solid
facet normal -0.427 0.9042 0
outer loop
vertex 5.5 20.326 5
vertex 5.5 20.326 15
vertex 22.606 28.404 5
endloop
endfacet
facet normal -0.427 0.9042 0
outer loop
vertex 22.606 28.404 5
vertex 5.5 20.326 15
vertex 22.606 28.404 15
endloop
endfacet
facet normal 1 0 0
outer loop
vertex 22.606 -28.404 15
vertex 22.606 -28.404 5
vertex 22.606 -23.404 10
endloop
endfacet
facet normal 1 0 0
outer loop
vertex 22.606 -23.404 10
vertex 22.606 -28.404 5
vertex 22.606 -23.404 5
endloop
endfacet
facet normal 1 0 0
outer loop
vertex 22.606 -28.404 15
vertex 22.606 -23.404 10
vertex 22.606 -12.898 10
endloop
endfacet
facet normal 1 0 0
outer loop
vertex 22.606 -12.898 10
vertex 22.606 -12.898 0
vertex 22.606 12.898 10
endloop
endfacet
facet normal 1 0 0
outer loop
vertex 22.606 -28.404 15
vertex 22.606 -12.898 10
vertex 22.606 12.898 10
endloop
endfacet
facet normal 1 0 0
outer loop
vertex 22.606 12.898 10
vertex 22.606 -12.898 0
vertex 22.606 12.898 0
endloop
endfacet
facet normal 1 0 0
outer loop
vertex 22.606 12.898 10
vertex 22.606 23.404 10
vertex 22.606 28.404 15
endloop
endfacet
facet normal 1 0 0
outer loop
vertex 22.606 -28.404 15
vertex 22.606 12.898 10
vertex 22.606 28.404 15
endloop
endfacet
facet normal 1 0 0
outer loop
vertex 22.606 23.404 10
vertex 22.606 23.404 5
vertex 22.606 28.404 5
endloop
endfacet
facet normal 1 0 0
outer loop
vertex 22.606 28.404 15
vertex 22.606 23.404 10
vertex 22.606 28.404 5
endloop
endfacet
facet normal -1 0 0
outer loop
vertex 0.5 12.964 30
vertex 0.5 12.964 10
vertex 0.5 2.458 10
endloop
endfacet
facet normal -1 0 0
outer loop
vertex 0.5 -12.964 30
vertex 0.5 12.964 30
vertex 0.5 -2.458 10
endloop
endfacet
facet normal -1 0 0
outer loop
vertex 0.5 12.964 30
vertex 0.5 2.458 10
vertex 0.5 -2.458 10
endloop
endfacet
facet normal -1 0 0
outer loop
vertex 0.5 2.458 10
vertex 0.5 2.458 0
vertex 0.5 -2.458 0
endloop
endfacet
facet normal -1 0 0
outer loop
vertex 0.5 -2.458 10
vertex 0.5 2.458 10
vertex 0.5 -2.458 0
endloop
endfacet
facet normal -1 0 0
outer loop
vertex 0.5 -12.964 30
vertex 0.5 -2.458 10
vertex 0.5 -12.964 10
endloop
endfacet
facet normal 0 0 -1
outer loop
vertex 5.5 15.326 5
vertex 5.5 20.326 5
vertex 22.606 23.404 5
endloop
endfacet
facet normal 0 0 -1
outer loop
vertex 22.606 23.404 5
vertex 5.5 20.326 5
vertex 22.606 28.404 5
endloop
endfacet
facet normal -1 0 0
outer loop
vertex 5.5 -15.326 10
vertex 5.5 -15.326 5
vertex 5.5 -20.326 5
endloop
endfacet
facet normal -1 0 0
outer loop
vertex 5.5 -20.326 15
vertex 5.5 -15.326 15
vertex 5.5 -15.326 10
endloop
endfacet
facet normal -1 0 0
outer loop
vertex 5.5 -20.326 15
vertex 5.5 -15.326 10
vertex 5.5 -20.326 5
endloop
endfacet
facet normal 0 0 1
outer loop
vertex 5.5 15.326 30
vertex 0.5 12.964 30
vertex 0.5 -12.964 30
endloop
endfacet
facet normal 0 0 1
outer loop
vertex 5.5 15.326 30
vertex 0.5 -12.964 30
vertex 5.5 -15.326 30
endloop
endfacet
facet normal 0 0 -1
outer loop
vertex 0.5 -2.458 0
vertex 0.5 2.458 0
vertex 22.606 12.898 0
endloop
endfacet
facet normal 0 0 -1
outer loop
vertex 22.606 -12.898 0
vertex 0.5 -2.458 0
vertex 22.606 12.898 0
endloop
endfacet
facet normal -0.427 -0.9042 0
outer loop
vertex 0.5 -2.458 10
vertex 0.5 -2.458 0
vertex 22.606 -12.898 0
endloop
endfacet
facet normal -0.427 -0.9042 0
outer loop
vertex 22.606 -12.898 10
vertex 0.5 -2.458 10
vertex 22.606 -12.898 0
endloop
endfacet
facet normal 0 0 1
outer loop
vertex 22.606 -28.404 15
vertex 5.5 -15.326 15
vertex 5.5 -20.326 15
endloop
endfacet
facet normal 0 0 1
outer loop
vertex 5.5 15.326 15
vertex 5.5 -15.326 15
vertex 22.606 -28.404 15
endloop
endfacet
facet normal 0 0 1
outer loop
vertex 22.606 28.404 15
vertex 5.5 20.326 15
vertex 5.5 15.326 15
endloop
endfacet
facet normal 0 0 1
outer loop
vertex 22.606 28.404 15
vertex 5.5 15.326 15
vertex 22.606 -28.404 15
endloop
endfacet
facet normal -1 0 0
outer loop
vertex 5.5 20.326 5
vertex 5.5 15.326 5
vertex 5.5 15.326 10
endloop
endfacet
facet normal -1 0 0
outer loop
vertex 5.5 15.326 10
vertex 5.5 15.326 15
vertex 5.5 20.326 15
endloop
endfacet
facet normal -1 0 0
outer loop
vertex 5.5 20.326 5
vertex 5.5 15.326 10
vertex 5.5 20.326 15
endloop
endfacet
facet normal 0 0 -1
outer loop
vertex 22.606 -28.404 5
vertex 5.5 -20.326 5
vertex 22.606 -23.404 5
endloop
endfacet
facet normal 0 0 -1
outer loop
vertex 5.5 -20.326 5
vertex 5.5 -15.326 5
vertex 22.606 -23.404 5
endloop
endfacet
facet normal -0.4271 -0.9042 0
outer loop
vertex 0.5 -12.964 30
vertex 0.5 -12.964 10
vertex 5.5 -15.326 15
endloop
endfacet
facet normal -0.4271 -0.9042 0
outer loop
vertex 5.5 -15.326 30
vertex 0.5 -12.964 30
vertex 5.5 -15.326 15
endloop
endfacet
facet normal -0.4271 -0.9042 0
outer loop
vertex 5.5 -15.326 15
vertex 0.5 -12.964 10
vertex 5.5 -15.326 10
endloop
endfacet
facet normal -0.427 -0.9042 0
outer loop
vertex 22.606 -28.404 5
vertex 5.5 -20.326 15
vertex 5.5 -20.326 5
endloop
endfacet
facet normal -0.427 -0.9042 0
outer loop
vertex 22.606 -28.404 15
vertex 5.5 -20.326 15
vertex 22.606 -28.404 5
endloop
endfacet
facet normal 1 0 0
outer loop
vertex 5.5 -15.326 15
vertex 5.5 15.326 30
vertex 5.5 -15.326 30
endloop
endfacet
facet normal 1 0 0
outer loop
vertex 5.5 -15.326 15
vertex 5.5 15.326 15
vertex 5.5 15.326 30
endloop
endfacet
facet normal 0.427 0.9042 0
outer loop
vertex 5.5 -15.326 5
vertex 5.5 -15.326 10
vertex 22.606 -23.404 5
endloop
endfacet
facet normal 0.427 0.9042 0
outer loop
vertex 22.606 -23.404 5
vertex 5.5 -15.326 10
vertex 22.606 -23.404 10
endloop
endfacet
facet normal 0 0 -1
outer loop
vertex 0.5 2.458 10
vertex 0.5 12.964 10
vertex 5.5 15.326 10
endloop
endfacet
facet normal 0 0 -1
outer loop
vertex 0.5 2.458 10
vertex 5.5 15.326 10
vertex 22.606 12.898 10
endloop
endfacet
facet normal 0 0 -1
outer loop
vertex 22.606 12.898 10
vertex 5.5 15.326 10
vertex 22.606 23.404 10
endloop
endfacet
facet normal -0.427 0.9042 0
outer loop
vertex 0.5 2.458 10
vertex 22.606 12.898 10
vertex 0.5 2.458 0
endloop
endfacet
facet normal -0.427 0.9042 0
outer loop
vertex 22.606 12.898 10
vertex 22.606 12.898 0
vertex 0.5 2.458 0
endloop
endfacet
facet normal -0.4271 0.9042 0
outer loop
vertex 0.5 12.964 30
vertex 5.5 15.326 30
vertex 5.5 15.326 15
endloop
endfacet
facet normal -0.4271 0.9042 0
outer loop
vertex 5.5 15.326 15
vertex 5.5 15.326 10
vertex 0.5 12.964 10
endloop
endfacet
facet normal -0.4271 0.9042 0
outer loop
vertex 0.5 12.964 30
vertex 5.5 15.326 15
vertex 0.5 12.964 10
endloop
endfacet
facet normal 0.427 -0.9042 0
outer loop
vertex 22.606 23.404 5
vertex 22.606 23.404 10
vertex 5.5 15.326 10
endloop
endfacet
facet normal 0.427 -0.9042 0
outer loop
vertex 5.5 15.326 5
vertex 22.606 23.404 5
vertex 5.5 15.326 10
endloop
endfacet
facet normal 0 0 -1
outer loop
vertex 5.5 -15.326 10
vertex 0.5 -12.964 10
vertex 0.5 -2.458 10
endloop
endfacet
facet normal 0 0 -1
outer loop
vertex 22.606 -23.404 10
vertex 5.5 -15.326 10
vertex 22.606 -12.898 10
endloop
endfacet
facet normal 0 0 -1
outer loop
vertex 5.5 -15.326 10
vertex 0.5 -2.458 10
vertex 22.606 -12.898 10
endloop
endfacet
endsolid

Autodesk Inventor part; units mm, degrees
ref_plane "YZ Plane" through (0, 0, 0) normal (1, 0, 0) x (0, 1, 0)
ref_plane "XZ Plane" through (0, 0, 0) normal (0, 1, 0) x (-1, 0, 0)
ref_plane "XY Plane" through (0, 0, 0) normal (0, 0, 1) x (1, 0, 0)
sketch "스케치1" plane through (0, 0, 0) normal (0, 0, 1) x (1, 0, 0)
  line L0 (0, 2.222) -> (0, -2.222)
  line L1 (0, -2.222) -> (22.6058, -12.8981)
  line L2 (22.6058, -12.8981) -> (22.6058, 12.8981)
  line L3 (22.6058, 12.8981) -> (0, 2.222)
  line L4 (0.5, 2.4581) -> (0.5, -2.4581)
  point P0 (0, 0)
  point P1 (0, 0)
  dimension "d0" = 25
  dimension "d1" = 115.28
  dimension "d2" = 115.28
  dimension "d3" = 4.444
  dimension "d4" = 0.5
extrude "돌출1" add sketch "스케치1" along normal blind 10 contours L3 L2 L1 L4
sketch "스케치2" plane through (0, 0, 10) normal (0, 0, 1) x (1, 0, 0)
  line L0 (0.5, 2.4581) -> (0.5, -2.4581) projected
  line L1 (0.5, -2.4581) -> (22.6058, -12.8981) projected
  line L2 (22.6058, -12.8981) -> (22.6058, 12.8981) projected
  line L3 (22.6058, 12.8981) -> (0.5, 2.4581) projected
  line L4 (0.5, 12.9643) -> (22.6058, 23.4042)
  line L5 (0.5, -12.9643) -> (22.6058, -23.4042)
  line L6 (22.6058, -23.4042) -> (22.6058, -12.8981)
  line L7 (22.6058, -12.8981) -> (22.6058, 12.8981) projected
  line L8 (22.6058, 23.4042) -> (22.6058, 12.8981)
  line L9 (0.5, 12.9643) -> (0.5, 2.4581)
  line L10 (0.5, 2.4581) -> (0.5, -2.4581) projected
  line L11 (0.5, -12.9643) -> (0.5, -2.4581)
  line L12 (22.6058, 12.8981) -> (0.5, 2.4581) projected
  line L13 (0.5, -2.4581) -> (22.6058, -12.8981) projected
  point P0 (0, 0)
  dimension "d23" = 9.5
  dimension "d24" = 9.5
extrude "돌출2" add sketch "스케치2" along normal blind 5
sketch "스케치3" plane through (0, 0, 15) normal (0, 0, 1) x (1, 0, 0)
  line L0 (22.6058, -23.4042) -> (22.6058, 23.4042) projected
  line L1 (22.6058, 23.4042) -> (0.5, 12.9643) projected
  line L2 (0.5, 12.9643) -> (0.5, -12.9643) projected
  line L3 (0.5, -12.9643) -> (22.6058, -23.4042) projected
  line L4 (22.6058, 23.4042) -> (0.5, 12.9643) projected
  line L5 (0.5, -12.9643) -> (22.6058, -23.4042) projected
  line L6 (5.5, 15.3256) -> (5.5, -15.3256)
  line L7 (0.5, 12.9643) -> (0.5, -12.9643) projected
  point P0 (0, 0)
  point P1 (5.5, -15.3256)
  dimension "d18" = 5
extrude "돌출3" add sketch "스케치3" along normal blind 15 contours L3 L2 L1 L6
sketch "스케치4" plane through (0, 0, 15) normal (0, 0, 1) x (1, 0, 0)
  line L0 (5.5, 15.3256) -> (5.5, -15.3256) projected
  line L1 (5.5, -15.3256) -> (22.6058, -23.4042) projected
  line L2 (22.6058, -23.4042) -> (22.6058, 23.4042) projected
  line L3 (22.6058, 23.4042) -> (5.5, 15.3256) projected
  line L4 (5.5, 15.3256) -> (5.5, -15.3256) projected
  line L5 (5.5, 15.3256) -> (5.5, 20.3256)
  line L6 (5.5, 20.3256) -> (22.6058, 28.4042)
  line L7 (22.6058, 12.8981) -> (22.6058, 23.4042) projected
  line L8 (22.6058, 28.4042) -> (22.6058, 23.4042)
  line L9 (5.5, -15.3256) -> (5.5, -20.3256)
  line L10 (5.5, -20.3256) -> (22.6058, -28.4042)
  line L11 (22.6058, -28.4042) -> (22.6058, -23.4042)
  line L12 (5.5, -15.3256) -> (22.6058, -23.4042) projected
  point P0 (0, 0)
  dimension "d19" = 5
  dimension "d20" = 5
extrude "돌출4" add sketch "스케치4" against normal blind 10 contours L5 L6 L8 L3 | L1 L11 L10 L9
properties part number "_3D 인쇄"
